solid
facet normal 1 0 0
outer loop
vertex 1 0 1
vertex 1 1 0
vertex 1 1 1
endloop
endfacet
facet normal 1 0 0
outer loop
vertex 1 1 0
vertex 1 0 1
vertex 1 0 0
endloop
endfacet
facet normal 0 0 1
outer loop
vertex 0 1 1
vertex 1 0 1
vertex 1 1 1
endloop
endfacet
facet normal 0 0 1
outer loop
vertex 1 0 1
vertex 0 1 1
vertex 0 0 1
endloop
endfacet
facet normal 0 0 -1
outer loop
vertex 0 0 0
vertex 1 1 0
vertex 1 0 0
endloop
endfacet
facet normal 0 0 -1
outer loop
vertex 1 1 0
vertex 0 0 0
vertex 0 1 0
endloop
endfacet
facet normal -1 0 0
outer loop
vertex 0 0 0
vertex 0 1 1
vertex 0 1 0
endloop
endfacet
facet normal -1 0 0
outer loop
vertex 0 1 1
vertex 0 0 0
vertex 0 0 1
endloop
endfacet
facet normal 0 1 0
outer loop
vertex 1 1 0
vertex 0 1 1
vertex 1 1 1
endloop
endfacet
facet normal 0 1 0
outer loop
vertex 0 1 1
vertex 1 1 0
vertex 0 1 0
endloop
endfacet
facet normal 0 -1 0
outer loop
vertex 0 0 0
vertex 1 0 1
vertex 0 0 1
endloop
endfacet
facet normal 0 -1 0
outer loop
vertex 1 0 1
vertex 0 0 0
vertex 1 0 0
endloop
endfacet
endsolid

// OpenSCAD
color("nosuchcolor") cube();
color() cube();
color([1e-5, 0.5, 1/3, 2]) cube();
color(5) cube();
